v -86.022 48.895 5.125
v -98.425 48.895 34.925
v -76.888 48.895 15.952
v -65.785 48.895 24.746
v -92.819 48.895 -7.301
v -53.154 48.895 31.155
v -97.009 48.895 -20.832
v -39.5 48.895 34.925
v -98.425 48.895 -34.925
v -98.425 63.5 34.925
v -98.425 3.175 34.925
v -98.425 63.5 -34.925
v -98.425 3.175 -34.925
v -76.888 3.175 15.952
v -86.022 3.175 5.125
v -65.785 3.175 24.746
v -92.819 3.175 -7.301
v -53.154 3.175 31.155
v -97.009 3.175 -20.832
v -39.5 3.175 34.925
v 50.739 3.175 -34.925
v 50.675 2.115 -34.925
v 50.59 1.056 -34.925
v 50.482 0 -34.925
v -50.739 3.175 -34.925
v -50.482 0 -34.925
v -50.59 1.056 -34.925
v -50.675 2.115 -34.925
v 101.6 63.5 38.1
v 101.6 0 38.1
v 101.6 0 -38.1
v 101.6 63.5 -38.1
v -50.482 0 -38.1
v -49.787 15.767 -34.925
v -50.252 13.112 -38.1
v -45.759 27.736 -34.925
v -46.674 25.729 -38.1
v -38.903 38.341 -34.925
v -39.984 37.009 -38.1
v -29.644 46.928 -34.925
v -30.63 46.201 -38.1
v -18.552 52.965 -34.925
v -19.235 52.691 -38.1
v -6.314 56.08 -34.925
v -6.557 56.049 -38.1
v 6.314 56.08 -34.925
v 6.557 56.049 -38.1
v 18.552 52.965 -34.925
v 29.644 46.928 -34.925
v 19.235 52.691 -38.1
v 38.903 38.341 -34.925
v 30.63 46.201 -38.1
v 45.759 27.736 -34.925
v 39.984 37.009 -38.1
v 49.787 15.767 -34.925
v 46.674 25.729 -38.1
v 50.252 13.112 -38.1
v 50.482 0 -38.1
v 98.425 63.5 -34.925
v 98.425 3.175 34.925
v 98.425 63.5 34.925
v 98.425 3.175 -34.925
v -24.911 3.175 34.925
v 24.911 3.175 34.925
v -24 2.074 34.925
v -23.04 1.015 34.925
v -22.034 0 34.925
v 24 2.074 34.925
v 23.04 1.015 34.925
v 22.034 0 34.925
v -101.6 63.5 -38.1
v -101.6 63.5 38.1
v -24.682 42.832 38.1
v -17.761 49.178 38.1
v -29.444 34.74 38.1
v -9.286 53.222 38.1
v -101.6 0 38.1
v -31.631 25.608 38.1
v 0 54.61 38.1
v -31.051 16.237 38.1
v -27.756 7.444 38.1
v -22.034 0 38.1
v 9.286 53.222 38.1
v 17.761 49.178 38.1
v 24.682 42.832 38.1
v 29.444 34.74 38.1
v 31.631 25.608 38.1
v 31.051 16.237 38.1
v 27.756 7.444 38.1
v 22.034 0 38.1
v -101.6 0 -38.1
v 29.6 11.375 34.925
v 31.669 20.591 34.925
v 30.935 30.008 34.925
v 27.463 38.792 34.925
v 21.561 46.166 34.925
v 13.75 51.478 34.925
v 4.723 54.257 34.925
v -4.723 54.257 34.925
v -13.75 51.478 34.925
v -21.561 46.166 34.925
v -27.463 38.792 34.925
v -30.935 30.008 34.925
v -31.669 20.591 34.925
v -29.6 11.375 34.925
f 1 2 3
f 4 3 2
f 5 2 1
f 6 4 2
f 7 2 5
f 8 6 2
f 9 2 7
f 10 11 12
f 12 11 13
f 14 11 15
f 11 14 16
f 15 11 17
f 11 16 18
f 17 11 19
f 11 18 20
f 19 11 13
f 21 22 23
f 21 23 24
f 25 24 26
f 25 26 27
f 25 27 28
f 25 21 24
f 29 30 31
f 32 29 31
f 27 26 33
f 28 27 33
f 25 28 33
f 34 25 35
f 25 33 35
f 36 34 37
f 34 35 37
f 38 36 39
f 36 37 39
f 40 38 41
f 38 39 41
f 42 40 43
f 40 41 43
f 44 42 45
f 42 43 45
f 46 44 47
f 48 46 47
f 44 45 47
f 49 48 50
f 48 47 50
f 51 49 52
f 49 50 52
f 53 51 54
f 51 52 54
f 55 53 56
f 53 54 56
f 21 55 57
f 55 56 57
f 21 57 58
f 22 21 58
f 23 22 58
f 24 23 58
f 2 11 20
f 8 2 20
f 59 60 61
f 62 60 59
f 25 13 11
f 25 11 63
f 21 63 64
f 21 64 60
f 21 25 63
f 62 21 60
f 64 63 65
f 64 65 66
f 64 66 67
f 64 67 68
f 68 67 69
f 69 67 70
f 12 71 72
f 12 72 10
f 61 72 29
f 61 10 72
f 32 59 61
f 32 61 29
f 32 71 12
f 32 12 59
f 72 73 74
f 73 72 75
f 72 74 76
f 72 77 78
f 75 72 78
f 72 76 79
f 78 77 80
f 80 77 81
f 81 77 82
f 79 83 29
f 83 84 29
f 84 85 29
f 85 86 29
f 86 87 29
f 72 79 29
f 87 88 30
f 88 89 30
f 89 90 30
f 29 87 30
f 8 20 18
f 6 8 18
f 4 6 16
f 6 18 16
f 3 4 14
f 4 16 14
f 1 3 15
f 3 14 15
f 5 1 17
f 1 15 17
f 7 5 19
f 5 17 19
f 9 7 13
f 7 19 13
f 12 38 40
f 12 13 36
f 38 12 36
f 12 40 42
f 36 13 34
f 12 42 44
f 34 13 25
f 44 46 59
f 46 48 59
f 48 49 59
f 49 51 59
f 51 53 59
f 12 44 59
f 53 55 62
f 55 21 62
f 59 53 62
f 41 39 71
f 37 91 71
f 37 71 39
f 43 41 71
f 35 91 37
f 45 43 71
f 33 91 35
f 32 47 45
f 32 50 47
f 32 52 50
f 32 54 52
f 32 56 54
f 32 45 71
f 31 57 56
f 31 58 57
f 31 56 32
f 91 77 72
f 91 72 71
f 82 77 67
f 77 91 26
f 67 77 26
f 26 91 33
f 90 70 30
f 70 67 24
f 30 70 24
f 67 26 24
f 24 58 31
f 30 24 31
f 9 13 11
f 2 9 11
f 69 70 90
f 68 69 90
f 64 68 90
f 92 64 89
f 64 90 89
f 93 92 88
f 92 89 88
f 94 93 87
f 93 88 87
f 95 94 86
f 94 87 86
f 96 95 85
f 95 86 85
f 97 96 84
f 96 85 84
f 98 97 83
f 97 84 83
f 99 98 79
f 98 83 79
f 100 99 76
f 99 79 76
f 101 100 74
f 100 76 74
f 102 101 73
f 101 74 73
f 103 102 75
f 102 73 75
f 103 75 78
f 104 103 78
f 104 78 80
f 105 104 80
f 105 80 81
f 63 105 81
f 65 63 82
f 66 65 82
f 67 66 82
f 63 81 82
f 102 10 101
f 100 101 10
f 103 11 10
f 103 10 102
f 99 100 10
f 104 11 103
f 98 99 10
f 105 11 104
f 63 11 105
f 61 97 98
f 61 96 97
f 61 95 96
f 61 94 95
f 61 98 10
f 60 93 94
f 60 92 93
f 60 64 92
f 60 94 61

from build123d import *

# Parameters (mm, degrees)
SKETCH1_W                         = 203.2
SKETCH1_H                         = 76.2
BOSS_EXTRUDE1_DEPTH               = 63.5
SHELL1_T                          = -3.175
CUT_EXTRUDE1_BACK_MOUSEHOLE_DEPTH = 3.175
SKETCH3_R                         = 31.75
CUT_EXTRUDE2_DEPTH                = 3.175
BOSS_EXTRUDE2_DEPTH               = 45.72


with BuildPart() as part:
    # Sketch1 → Boss-Extrude1 (new body)
    with BuildSketch(Plane(origin=(0, 0, 0), x_dir=(1, 0, 0), z_dir=(0, 1, 0))):
        Rectangle(SKETCH1_W, SKETCH1_H)
    extrude(amount=BOSS_EXTRUDE1_DEPTH)

    # Shell1
    shell1_openings = [part.faces().sort_by_distance(p)[0] for p in [
        (0, 63.5, 0),
    ]]
    offset(amount=SHELL1_T, openings=shell1_openings, kind=Kind.INTERSECTION)

    # Sketch2 → Cut-Extrude1 BACK MOUSEHOLE (cut)
    with BuildSketch(Plane(origin=(0, 0, -38.1), x_dir=(-1, 0, 0), z_dir=(0, 0, -1))):
        with BuildLine():
            Line((-50.482186023, 0), (50.482186023, 0))
            ThreePointArc((50.482186023, 0), (0, 56.473525739), (-50.482186023, 0))
        make_face()
    extrude(amount=-CUT_EXTRUDE1_BACK_MOUSEHOLE_DEPTH, mode=Mode.SUBTRACT)

    # Sketch3 → Cut-Extrude2 (cut)
    with BuildSketch(Plane.XY.offset(38.1)):
        with Locations((0, 22.86)):
            Circle(SKETCH3_R)
    extrude(amount=-CUT_EXTRUDE2_DEPTH, mode=Mode.SUBTRACT)


with BuildPart() as body_2:
    # Sketch4 → Boss-Extrude2 (new body)
    with BuildSketch(Plane(origin=(0, 3.175, 0), x_dir=(1, 0, 0), z_dir=(0, 1, 0))):
        with BuildLine():
            Line((-98.425, 34.925), (-98.425, -34.925))
            Line((-98.425, -34.925), (-39.500064478, -34.925))
            ThreePointArc((-39.500064478, -34.925), (-81.726241757, -10.767369511), (-98.425, 34.925))
        make_face()
    extrude(amount=BOSS_EXTRUDE2_DEPTH)


solid = Compound([part.part, body_2.part])
